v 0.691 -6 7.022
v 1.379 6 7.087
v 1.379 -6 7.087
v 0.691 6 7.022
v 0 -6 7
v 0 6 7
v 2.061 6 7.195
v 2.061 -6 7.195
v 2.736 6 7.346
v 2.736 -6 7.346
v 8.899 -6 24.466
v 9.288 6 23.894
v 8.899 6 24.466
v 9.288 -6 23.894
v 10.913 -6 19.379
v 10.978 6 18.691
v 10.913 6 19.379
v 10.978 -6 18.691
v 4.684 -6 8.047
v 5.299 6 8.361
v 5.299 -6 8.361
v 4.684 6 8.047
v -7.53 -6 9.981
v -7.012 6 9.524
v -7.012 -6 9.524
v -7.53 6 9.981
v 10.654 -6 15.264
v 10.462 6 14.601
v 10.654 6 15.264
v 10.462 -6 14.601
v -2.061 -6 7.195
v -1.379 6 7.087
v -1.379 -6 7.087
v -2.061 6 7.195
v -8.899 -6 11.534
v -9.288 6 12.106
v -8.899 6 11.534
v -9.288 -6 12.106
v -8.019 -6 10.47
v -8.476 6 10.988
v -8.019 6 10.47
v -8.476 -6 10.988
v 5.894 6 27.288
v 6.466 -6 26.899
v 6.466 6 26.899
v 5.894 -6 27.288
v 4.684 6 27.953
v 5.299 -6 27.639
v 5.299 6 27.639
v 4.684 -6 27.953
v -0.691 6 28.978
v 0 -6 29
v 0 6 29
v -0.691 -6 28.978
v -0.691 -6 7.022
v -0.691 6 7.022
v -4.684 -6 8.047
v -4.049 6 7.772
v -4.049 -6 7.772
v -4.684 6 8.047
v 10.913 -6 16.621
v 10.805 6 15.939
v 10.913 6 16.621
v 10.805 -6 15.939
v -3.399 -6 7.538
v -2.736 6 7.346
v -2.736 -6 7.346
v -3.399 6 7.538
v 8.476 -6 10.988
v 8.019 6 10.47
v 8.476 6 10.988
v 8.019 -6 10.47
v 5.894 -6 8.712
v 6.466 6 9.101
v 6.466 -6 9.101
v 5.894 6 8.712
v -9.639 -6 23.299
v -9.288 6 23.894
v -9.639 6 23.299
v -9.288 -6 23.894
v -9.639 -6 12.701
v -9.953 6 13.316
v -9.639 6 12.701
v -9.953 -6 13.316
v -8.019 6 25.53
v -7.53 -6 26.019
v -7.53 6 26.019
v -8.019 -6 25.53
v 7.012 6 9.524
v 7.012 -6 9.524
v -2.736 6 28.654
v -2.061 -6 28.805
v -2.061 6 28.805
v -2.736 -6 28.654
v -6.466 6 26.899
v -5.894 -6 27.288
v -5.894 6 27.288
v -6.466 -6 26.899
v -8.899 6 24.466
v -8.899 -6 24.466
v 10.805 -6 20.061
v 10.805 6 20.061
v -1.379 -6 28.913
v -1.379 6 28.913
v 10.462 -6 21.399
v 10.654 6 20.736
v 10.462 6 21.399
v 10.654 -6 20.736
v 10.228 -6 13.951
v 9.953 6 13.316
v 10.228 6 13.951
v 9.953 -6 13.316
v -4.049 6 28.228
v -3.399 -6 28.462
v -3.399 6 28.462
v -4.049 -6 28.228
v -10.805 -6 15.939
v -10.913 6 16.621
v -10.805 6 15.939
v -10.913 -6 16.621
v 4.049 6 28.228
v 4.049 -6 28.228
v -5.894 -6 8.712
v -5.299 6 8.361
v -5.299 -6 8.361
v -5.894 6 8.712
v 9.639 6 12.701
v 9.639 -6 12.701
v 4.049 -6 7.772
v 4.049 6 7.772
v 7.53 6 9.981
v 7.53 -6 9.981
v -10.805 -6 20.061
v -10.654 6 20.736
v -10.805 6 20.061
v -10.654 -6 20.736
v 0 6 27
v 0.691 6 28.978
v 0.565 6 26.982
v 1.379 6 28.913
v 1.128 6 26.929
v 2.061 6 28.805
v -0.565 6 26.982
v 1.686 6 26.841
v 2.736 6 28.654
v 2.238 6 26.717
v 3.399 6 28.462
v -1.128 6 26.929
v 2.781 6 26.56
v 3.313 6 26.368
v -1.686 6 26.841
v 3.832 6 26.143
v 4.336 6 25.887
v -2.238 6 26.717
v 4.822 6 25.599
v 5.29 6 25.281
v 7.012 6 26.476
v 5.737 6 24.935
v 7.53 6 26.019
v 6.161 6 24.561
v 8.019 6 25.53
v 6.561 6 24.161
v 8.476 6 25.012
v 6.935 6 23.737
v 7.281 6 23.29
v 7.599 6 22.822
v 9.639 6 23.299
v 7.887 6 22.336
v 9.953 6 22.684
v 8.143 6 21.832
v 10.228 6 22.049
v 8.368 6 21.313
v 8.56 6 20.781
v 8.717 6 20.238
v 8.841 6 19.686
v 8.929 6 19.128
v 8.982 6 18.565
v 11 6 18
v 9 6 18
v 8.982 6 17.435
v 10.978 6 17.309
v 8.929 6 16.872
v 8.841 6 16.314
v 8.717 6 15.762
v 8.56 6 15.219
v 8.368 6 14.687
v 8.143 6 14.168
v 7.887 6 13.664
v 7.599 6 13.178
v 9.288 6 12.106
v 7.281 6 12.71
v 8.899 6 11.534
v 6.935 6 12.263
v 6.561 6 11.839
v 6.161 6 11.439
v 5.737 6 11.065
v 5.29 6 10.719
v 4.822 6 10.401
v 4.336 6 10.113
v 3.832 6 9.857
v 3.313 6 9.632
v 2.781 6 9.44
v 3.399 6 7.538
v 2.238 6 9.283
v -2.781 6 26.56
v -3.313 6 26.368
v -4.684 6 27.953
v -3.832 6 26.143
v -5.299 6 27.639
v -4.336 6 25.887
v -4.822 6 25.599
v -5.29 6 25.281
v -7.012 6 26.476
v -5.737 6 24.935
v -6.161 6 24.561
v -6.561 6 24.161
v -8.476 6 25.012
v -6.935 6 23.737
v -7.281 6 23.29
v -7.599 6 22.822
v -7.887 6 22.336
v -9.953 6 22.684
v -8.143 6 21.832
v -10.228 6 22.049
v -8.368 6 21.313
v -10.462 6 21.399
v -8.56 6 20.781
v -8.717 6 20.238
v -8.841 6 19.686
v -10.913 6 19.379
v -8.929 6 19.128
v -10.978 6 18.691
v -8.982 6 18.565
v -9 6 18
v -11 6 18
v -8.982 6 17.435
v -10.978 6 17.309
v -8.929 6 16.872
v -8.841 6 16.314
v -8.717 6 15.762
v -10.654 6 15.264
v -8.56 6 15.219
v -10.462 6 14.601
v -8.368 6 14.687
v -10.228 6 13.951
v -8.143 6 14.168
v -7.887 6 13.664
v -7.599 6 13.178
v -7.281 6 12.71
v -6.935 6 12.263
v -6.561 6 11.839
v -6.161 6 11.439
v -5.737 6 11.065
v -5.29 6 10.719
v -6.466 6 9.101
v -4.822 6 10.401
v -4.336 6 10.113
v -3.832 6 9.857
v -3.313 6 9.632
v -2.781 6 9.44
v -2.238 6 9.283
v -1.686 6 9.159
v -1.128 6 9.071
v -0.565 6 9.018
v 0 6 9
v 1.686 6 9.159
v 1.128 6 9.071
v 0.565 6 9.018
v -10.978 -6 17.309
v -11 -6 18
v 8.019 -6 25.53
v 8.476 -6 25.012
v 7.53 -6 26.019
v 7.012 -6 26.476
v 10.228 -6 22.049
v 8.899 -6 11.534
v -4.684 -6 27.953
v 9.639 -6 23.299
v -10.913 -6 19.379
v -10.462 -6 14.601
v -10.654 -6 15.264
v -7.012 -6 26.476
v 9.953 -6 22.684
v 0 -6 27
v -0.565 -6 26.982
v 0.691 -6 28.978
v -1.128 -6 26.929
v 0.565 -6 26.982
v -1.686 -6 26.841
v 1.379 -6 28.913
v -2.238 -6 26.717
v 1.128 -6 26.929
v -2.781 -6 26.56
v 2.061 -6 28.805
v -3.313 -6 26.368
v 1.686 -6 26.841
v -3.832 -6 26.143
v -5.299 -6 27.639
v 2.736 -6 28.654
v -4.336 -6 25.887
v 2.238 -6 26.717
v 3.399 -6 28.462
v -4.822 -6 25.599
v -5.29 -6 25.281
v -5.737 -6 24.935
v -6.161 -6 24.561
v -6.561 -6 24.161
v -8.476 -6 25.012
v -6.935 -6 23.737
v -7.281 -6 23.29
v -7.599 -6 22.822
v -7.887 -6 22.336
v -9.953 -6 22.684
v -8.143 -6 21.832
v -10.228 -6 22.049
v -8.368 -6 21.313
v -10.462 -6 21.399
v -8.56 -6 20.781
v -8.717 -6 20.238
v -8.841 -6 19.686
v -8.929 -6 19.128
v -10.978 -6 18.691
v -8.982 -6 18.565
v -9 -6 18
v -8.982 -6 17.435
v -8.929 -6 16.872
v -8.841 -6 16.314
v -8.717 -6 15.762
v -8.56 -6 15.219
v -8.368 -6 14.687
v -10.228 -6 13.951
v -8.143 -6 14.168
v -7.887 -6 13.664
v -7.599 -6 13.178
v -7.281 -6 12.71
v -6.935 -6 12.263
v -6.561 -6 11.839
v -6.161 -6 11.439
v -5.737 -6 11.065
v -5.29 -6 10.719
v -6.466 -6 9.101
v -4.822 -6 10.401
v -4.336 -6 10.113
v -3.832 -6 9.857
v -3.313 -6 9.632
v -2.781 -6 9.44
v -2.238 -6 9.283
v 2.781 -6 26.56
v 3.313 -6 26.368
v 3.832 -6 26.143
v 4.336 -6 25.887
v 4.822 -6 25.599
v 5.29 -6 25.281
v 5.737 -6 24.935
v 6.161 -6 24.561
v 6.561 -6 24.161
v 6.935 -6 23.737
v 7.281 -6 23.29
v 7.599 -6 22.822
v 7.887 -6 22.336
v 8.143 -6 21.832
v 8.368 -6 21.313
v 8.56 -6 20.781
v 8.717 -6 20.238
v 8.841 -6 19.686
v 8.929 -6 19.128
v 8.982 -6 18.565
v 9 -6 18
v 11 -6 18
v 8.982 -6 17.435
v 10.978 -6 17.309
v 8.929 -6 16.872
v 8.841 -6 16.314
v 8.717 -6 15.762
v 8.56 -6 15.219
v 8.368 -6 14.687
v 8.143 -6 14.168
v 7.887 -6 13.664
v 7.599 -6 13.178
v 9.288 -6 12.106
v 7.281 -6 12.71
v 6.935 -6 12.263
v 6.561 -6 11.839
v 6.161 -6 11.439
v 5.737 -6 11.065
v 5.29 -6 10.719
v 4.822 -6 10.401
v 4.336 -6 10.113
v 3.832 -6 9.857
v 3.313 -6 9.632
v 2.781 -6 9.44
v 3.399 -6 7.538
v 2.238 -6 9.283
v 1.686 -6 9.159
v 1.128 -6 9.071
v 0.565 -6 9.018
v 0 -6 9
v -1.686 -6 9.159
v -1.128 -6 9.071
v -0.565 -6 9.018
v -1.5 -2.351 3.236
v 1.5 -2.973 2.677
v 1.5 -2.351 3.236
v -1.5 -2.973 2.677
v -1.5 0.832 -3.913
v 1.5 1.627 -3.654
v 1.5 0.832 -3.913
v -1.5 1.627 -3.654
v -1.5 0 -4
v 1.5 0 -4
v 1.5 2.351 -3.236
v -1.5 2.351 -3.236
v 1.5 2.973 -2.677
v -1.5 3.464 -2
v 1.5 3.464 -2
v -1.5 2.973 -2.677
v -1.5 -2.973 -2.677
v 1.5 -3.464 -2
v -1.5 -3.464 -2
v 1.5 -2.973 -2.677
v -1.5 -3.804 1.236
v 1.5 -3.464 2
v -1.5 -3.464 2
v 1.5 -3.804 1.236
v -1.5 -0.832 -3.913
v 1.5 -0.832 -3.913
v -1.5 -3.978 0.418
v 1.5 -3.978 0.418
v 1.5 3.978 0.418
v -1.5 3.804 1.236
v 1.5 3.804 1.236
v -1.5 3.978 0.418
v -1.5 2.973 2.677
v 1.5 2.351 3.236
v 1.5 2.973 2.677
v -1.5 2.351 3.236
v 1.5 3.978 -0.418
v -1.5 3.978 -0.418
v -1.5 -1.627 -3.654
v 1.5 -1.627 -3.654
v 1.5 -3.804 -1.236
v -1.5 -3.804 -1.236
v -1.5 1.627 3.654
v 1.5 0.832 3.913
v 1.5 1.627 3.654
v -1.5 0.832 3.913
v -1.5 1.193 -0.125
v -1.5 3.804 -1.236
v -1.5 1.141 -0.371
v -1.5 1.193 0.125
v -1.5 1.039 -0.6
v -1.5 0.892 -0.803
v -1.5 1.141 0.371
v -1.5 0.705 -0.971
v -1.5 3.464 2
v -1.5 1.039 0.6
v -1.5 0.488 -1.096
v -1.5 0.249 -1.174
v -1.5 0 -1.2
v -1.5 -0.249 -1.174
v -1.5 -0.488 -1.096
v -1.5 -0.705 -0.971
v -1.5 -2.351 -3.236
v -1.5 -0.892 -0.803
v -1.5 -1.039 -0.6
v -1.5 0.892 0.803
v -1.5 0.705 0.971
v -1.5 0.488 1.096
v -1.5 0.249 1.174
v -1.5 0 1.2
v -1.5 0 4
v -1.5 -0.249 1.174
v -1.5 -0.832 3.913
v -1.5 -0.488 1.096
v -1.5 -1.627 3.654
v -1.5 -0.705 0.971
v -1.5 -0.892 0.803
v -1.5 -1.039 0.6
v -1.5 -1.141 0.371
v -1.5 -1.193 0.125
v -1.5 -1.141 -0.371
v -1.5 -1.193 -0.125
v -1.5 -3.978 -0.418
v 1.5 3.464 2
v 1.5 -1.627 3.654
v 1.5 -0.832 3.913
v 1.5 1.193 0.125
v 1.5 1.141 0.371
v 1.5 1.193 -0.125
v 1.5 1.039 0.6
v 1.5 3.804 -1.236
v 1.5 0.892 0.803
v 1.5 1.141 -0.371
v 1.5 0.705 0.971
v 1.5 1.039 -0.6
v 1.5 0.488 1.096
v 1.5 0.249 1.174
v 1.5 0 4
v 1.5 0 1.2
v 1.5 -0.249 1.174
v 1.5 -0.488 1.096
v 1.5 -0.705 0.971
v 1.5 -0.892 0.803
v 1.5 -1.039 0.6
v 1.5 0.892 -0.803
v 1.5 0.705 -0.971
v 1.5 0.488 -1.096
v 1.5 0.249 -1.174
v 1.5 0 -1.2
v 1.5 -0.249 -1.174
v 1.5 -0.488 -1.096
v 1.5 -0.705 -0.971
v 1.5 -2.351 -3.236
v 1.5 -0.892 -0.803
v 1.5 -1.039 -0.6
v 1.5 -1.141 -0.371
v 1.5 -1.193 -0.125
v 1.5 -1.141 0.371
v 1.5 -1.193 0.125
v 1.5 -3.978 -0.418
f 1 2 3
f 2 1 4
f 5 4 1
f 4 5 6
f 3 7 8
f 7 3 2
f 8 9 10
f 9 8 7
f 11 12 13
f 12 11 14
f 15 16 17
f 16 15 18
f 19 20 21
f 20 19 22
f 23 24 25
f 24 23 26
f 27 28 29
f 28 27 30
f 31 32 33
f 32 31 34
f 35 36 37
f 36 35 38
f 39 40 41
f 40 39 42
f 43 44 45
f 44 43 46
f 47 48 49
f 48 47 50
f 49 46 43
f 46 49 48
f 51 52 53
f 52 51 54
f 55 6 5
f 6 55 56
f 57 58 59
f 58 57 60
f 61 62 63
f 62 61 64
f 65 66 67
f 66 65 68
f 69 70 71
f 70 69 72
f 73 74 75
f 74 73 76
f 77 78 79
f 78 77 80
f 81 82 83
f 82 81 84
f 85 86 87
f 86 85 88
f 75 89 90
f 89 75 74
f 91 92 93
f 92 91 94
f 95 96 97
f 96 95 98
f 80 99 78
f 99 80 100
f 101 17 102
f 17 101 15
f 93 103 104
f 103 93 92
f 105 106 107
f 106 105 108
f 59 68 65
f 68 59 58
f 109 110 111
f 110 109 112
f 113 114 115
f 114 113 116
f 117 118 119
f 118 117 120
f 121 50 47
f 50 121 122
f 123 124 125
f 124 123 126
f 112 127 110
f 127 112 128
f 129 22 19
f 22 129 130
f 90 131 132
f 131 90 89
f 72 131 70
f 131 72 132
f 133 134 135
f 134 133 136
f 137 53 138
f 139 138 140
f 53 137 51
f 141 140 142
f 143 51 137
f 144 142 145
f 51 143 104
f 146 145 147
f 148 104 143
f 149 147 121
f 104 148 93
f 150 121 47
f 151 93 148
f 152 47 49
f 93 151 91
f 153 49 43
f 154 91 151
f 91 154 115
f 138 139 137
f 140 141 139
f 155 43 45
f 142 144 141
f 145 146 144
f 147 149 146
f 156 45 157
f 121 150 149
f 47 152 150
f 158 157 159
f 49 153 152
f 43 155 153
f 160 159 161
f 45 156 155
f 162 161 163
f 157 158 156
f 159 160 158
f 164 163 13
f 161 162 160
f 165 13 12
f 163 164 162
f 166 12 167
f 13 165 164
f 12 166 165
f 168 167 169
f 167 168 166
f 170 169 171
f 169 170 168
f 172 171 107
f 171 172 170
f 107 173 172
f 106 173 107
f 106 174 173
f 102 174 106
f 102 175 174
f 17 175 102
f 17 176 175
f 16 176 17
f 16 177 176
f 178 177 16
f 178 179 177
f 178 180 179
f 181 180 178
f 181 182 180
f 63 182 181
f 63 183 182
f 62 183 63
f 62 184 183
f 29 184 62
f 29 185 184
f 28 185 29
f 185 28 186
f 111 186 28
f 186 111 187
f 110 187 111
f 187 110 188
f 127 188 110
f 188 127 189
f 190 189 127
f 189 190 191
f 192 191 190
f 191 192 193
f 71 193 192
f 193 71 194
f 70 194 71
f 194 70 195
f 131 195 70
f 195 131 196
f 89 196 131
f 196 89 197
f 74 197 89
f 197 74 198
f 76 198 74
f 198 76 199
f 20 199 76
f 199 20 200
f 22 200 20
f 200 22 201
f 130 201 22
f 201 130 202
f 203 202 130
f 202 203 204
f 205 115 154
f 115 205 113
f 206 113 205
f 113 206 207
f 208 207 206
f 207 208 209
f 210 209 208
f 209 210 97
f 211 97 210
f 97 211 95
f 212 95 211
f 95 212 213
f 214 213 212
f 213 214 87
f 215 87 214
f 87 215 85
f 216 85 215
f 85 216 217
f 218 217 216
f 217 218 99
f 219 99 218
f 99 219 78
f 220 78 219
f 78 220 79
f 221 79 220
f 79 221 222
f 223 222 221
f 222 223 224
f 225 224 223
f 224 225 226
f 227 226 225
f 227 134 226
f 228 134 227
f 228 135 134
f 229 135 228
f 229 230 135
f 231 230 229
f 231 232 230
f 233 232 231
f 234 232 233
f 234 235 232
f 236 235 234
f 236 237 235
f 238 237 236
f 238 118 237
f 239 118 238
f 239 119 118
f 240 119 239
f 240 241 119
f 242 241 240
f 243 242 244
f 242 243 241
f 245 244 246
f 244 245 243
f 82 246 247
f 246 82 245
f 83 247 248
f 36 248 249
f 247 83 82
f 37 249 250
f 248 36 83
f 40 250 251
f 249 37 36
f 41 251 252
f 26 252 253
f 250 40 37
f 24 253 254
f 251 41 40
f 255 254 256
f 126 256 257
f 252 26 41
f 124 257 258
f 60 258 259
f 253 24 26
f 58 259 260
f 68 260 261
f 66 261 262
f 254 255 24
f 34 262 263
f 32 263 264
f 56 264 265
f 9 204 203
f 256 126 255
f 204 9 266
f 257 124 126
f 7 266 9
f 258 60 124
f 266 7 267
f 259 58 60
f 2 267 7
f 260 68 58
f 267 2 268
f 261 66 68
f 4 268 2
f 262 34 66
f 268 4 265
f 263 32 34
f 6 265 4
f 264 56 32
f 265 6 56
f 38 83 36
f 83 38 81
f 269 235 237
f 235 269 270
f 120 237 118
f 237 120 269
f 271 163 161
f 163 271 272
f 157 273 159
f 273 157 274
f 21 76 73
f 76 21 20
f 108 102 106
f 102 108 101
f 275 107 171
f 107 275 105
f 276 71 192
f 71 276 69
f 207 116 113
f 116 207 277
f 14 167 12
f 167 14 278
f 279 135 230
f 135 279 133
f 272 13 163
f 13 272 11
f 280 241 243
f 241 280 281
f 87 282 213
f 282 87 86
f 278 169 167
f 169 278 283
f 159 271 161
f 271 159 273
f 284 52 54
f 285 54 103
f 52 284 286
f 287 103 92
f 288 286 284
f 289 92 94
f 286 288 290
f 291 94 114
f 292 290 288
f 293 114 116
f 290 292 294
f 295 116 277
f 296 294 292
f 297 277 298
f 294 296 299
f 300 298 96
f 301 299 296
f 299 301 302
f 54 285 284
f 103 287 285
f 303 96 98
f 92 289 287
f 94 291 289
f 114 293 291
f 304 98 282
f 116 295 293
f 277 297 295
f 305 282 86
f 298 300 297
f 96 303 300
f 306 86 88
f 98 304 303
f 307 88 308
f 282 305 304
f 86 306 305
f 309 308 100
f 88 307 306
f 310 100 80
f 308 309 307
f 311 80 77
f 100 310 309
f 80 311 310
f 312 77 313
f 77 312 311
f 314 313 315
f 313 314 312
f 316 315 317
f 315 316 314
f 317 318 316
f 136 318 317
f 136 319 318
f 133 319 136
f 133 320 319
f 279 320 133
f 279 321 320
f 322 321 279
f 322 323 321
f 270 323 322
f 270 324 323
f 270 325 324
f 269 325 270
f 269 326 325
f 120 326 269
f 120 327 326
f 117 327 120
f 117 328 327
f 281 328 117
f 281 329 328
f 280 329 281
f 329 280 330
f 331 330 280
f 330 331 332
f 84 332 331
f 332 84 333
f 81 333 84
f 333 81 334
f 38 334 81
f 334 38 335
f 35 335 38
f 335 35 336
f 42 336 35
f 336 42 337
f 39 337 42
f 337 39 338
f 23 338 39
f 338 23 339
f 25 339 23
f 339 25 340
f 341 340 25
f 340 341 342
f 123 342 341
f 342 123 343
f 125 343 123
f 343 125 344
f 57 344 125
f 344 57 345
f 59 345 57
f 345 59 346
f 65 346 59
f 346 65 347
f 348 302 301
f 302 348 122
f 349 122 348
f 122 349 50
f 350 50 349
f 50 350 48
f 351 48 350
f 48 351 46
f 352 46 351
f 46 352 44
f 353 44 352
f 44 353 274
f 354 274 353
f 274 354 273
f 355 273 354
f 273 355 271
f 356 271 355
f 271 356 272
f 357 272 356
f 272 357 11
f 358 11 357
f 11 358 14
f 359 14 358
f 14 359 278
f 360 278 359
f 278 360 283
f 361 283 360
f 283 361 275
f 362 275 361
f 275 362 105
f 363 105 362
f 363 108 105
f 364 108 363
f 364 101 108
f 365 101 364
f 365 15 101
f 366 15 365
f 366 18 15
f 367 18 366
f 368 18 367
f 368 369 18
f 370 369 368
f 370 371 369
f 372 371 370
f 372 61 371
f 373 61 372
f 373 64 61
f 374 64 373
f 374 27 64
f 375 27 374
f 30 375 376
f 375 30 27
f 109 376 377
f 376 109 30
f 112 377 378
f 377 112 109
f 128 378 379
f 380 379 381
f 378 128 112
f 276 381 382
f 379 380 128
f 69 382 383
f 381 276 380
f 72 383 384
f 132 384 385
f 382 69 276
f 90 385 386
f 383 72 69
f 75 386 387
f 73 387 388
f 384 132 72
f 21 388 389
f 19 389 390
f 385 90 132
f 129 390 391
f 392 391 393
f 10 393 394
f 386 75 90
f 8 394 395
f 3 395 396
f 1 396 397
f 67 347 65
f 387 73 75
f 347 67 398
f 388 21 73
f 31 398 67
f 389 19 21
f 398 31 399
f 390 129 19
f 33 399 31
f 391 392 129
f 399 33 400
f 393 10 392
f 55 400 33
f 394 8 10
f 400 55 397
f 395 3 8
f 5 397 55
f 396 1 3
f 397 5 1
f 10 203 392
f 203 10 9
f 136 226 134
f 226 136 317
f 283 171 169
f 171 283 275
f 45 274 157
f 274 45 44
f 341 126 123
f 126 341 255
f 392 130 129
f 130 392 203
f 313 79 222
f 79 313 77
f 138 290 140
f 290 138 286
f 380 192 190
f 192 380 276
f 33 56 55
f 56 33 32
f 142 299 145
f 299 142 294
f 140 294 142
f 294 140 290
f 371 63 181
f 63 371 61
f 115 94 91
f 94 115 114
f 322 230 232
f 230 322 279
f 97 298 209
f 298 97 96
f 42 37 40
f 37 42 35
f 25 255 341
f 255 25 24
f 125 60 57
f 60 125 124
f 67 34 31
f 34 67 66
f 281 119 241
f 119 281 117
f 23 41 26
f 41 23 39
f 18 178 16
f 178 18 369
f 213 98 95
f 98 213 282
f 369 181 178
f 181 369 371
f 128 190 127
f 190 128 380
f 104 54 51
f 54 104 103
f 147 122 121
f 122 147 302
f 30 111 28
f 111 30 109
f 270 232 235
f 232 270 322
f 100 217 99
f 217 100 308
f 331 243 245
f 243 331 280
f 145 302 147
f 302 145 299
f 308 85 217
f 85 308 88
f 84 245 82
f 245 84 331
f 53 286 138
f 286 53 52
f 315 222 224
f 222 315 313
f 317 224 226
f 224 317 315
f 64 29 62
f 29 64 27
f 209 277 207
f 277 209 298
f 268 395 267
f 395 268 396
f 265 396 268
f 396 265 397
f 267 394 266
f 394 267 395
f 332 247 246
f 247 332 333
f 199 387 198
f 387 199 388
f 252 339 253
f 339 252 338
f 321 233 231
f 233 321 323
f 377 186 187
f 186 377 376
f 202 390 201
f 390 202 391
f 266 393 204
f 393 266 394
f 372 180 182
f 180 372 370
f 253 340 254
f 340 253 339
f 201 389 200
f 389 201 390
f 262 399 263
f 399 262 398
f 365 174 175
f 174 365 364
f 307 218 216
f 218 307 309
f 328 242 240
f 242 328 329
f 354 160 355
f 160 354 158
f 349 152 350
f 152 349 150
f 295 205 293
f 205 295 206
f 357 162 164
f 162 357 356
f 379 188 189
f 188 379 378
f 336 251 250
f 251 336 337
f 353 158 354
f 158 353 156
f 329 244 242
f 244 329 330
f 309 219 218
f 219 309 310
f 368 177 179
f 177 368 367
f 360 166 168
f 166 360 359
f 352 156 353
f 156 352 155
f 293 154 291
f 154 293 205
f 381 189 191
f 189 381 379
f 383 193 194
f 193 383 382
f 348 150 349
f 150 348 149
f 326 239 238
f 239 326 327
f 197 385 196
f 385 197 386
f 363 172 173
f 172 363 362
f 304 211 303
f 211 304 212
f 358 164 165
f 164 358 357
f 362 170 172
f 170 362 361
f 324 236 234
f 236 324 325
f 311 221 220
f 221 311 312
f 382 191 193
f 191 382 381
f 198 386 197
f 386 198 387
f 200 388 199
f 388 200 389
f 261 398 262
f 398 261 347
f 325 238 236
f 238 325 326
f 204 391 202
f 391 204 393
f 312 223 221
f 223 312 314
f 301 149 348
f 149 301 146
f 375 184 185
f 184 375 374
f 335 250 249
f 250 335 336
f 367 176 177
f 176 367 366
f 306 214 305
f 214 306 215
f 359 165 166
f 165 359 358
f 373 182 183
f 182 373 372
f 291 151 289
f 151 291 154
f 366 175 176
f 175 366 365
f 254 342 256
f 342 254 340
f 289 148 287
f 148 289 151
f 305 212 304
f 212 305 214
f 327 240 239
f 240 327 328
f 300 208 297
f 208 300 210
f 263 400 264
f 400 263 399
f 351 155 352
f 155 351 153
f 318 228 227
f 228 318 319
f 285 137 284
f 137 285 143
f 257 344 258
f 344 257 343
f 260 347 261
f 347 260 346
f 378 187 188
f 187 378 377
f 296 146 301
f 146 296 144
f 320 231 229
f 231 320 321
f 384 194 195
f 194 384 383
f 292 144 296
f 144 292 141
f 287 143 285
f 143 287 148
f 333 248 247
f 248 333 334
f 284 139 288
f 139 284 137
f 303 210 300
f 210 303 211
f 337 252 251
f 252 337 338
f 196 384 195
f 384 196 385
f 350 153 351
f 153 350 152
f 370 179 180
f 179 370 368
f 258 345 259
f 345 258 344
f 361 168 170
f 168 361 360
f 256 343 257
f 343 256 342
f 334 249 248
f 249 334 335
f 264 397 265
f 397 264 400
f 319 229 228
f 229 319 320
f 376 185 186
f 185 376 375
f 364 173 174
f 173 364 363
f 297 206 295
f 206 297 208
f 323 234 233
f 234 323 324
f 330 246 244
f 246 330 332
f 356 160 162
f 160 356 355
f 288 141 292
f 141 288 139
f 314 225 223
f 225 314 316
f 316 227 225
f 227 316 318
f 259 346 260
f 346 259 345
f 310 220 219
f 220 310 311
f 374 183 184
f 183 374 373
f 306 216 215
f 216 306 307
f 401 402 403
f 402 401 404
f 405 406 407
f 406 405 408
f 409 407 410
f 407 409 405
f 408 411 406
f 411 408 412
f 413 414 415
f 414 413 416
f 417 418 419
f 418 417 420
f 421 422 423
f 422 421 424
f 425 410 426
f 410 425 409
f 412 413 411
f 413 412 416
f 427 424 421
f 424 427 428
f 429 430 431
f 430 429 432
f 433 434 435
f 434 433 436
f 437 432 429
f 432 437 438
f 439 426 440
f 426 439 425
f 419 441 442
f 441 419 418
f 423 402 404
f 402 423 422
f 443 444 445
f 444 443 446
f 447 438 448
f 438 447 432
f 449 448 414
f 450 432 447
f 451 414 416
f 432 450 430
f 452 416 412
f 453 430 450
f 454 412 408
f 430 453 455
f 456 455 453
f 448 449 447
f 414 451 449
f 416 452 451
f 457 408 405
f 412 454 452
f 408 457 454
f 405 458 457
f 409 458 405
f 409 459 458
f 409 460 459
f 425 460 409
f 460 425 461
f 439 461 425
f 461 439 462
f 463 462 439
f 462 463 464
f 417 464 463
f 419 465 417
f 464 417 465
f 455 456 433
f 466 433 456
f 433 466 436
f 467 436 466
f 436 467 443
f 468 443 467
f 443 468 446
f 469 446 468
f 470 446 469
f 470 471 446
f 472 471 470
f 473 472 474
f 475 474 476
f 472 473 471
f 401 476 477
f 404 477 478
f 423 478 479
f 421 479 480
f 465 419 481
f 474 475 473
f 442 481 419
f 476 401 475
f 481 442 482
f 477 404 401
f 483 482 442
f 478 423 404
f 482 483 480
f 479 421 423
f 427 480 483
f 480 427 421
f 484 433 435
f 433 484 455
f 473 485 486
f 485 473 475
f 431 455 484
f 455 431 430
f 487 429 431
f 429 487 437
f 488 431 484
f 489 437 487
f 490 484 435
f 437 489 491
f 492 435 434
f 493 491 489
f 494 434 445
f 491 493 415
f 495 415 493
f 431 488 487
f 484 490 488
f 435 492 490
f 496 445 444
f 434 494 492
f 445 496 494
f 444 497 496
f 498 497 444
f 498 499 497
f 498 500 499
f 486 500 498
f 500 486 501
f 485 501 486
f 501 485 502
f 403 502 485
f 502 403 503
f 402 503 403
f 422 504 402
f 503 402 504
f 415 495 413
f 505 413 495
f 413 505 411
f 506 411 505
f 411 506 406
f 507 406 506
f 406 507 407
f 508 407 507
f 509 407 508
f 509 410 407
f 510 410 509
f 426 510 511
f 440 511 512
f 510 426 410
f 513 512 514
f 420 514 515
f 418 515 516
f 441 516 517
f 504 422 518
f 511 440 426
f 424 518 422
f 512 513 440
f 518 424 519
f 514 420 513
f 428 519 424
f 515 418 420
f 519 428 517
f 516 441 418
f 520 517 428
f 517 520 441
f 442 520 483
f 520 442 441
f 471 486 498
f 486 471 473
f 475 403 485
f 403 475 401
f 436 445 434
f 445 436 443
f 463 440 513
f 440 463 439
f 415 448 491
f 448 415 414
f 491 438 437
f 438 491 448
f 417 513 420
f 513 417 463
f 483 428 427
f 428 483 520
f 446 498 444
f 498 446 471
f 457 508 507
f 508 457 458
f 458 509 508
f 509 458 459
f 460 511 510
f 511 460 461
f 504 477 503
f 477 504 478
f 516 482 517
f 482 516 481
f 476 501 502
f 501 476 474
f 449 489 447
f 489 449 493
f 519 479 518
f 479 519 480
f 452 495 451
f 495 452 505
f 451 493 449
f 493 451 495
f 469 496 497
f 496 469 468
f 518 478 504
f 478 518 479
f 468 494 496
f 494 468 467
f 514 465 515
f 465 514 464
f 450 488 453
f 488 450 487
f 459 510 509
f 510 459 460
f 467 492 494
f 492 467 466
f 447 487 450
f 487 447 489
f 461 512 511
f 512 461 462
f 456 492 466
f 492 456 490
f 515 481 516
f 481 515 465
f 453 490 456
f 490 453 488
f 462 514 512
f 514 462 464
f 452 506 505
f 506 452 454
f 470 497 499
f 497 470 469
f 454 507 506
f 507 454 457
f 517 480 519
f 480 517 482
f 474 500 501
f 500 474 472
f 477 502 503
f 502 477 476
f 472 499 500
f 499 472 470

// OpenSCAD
// file: lib/openscad/hollowCylinder.scad
/*
	hollowCylinder() v1.0.0 by robert@cosmicrealms.com from https://github.com/Sembiance/openscad-modules
	Allows you to create a hollow cylinder
	
	Usage
	=====
	Prototype: hollowCylinder(d, h, wallWidth, $fn)
	Arguments:
		-         d = Diamater of the cylinder. Default: 5
		-         h = Height of the cylinder. Default: 10
		- wallWidth = How wide the walls should be. Default: 1
		-       $fn = How smooth you want the cylinder rounding to be. Default: 128

	Change Log
	==========
	2017-01-04: v1.0.0 - Initial Release
*/

// Example code:
/*
hollowCylinder(d=10, h=20);
translate([15, 0, 0]) { hollowCylinder(d=15, h=5, wallWidth=0.1); }
translate([30, 0, 0]) { hollowCylinder(d=10, h=2, wallWidth=4.5); }
*/

module hollowCylinder(d=5, h=10, wallWidth=1, $fn=100) {
	difference() {
            cylinder(d=d, h=h, center=true);
            translate([0, 0, -0.1])  cylinder(d=d-(wallWidth*2), h=h+0.2, center=true); 
	}
}
// main file
use <lib/openscad/hollowCylinder.scad>
$fn=30;
tensioner();

module tensioner(){
    translate([0,0,18])
    rotate([90,90,0])
    hollowCylinder(d=22, wallWidth=2, h=12);
    
    rotate([90,90,90]){
        difference(){
            cylinder(d=8, h=3, center=true);
            cylinder(d=2.4, h = 4, center=true);
        }
    }
}
